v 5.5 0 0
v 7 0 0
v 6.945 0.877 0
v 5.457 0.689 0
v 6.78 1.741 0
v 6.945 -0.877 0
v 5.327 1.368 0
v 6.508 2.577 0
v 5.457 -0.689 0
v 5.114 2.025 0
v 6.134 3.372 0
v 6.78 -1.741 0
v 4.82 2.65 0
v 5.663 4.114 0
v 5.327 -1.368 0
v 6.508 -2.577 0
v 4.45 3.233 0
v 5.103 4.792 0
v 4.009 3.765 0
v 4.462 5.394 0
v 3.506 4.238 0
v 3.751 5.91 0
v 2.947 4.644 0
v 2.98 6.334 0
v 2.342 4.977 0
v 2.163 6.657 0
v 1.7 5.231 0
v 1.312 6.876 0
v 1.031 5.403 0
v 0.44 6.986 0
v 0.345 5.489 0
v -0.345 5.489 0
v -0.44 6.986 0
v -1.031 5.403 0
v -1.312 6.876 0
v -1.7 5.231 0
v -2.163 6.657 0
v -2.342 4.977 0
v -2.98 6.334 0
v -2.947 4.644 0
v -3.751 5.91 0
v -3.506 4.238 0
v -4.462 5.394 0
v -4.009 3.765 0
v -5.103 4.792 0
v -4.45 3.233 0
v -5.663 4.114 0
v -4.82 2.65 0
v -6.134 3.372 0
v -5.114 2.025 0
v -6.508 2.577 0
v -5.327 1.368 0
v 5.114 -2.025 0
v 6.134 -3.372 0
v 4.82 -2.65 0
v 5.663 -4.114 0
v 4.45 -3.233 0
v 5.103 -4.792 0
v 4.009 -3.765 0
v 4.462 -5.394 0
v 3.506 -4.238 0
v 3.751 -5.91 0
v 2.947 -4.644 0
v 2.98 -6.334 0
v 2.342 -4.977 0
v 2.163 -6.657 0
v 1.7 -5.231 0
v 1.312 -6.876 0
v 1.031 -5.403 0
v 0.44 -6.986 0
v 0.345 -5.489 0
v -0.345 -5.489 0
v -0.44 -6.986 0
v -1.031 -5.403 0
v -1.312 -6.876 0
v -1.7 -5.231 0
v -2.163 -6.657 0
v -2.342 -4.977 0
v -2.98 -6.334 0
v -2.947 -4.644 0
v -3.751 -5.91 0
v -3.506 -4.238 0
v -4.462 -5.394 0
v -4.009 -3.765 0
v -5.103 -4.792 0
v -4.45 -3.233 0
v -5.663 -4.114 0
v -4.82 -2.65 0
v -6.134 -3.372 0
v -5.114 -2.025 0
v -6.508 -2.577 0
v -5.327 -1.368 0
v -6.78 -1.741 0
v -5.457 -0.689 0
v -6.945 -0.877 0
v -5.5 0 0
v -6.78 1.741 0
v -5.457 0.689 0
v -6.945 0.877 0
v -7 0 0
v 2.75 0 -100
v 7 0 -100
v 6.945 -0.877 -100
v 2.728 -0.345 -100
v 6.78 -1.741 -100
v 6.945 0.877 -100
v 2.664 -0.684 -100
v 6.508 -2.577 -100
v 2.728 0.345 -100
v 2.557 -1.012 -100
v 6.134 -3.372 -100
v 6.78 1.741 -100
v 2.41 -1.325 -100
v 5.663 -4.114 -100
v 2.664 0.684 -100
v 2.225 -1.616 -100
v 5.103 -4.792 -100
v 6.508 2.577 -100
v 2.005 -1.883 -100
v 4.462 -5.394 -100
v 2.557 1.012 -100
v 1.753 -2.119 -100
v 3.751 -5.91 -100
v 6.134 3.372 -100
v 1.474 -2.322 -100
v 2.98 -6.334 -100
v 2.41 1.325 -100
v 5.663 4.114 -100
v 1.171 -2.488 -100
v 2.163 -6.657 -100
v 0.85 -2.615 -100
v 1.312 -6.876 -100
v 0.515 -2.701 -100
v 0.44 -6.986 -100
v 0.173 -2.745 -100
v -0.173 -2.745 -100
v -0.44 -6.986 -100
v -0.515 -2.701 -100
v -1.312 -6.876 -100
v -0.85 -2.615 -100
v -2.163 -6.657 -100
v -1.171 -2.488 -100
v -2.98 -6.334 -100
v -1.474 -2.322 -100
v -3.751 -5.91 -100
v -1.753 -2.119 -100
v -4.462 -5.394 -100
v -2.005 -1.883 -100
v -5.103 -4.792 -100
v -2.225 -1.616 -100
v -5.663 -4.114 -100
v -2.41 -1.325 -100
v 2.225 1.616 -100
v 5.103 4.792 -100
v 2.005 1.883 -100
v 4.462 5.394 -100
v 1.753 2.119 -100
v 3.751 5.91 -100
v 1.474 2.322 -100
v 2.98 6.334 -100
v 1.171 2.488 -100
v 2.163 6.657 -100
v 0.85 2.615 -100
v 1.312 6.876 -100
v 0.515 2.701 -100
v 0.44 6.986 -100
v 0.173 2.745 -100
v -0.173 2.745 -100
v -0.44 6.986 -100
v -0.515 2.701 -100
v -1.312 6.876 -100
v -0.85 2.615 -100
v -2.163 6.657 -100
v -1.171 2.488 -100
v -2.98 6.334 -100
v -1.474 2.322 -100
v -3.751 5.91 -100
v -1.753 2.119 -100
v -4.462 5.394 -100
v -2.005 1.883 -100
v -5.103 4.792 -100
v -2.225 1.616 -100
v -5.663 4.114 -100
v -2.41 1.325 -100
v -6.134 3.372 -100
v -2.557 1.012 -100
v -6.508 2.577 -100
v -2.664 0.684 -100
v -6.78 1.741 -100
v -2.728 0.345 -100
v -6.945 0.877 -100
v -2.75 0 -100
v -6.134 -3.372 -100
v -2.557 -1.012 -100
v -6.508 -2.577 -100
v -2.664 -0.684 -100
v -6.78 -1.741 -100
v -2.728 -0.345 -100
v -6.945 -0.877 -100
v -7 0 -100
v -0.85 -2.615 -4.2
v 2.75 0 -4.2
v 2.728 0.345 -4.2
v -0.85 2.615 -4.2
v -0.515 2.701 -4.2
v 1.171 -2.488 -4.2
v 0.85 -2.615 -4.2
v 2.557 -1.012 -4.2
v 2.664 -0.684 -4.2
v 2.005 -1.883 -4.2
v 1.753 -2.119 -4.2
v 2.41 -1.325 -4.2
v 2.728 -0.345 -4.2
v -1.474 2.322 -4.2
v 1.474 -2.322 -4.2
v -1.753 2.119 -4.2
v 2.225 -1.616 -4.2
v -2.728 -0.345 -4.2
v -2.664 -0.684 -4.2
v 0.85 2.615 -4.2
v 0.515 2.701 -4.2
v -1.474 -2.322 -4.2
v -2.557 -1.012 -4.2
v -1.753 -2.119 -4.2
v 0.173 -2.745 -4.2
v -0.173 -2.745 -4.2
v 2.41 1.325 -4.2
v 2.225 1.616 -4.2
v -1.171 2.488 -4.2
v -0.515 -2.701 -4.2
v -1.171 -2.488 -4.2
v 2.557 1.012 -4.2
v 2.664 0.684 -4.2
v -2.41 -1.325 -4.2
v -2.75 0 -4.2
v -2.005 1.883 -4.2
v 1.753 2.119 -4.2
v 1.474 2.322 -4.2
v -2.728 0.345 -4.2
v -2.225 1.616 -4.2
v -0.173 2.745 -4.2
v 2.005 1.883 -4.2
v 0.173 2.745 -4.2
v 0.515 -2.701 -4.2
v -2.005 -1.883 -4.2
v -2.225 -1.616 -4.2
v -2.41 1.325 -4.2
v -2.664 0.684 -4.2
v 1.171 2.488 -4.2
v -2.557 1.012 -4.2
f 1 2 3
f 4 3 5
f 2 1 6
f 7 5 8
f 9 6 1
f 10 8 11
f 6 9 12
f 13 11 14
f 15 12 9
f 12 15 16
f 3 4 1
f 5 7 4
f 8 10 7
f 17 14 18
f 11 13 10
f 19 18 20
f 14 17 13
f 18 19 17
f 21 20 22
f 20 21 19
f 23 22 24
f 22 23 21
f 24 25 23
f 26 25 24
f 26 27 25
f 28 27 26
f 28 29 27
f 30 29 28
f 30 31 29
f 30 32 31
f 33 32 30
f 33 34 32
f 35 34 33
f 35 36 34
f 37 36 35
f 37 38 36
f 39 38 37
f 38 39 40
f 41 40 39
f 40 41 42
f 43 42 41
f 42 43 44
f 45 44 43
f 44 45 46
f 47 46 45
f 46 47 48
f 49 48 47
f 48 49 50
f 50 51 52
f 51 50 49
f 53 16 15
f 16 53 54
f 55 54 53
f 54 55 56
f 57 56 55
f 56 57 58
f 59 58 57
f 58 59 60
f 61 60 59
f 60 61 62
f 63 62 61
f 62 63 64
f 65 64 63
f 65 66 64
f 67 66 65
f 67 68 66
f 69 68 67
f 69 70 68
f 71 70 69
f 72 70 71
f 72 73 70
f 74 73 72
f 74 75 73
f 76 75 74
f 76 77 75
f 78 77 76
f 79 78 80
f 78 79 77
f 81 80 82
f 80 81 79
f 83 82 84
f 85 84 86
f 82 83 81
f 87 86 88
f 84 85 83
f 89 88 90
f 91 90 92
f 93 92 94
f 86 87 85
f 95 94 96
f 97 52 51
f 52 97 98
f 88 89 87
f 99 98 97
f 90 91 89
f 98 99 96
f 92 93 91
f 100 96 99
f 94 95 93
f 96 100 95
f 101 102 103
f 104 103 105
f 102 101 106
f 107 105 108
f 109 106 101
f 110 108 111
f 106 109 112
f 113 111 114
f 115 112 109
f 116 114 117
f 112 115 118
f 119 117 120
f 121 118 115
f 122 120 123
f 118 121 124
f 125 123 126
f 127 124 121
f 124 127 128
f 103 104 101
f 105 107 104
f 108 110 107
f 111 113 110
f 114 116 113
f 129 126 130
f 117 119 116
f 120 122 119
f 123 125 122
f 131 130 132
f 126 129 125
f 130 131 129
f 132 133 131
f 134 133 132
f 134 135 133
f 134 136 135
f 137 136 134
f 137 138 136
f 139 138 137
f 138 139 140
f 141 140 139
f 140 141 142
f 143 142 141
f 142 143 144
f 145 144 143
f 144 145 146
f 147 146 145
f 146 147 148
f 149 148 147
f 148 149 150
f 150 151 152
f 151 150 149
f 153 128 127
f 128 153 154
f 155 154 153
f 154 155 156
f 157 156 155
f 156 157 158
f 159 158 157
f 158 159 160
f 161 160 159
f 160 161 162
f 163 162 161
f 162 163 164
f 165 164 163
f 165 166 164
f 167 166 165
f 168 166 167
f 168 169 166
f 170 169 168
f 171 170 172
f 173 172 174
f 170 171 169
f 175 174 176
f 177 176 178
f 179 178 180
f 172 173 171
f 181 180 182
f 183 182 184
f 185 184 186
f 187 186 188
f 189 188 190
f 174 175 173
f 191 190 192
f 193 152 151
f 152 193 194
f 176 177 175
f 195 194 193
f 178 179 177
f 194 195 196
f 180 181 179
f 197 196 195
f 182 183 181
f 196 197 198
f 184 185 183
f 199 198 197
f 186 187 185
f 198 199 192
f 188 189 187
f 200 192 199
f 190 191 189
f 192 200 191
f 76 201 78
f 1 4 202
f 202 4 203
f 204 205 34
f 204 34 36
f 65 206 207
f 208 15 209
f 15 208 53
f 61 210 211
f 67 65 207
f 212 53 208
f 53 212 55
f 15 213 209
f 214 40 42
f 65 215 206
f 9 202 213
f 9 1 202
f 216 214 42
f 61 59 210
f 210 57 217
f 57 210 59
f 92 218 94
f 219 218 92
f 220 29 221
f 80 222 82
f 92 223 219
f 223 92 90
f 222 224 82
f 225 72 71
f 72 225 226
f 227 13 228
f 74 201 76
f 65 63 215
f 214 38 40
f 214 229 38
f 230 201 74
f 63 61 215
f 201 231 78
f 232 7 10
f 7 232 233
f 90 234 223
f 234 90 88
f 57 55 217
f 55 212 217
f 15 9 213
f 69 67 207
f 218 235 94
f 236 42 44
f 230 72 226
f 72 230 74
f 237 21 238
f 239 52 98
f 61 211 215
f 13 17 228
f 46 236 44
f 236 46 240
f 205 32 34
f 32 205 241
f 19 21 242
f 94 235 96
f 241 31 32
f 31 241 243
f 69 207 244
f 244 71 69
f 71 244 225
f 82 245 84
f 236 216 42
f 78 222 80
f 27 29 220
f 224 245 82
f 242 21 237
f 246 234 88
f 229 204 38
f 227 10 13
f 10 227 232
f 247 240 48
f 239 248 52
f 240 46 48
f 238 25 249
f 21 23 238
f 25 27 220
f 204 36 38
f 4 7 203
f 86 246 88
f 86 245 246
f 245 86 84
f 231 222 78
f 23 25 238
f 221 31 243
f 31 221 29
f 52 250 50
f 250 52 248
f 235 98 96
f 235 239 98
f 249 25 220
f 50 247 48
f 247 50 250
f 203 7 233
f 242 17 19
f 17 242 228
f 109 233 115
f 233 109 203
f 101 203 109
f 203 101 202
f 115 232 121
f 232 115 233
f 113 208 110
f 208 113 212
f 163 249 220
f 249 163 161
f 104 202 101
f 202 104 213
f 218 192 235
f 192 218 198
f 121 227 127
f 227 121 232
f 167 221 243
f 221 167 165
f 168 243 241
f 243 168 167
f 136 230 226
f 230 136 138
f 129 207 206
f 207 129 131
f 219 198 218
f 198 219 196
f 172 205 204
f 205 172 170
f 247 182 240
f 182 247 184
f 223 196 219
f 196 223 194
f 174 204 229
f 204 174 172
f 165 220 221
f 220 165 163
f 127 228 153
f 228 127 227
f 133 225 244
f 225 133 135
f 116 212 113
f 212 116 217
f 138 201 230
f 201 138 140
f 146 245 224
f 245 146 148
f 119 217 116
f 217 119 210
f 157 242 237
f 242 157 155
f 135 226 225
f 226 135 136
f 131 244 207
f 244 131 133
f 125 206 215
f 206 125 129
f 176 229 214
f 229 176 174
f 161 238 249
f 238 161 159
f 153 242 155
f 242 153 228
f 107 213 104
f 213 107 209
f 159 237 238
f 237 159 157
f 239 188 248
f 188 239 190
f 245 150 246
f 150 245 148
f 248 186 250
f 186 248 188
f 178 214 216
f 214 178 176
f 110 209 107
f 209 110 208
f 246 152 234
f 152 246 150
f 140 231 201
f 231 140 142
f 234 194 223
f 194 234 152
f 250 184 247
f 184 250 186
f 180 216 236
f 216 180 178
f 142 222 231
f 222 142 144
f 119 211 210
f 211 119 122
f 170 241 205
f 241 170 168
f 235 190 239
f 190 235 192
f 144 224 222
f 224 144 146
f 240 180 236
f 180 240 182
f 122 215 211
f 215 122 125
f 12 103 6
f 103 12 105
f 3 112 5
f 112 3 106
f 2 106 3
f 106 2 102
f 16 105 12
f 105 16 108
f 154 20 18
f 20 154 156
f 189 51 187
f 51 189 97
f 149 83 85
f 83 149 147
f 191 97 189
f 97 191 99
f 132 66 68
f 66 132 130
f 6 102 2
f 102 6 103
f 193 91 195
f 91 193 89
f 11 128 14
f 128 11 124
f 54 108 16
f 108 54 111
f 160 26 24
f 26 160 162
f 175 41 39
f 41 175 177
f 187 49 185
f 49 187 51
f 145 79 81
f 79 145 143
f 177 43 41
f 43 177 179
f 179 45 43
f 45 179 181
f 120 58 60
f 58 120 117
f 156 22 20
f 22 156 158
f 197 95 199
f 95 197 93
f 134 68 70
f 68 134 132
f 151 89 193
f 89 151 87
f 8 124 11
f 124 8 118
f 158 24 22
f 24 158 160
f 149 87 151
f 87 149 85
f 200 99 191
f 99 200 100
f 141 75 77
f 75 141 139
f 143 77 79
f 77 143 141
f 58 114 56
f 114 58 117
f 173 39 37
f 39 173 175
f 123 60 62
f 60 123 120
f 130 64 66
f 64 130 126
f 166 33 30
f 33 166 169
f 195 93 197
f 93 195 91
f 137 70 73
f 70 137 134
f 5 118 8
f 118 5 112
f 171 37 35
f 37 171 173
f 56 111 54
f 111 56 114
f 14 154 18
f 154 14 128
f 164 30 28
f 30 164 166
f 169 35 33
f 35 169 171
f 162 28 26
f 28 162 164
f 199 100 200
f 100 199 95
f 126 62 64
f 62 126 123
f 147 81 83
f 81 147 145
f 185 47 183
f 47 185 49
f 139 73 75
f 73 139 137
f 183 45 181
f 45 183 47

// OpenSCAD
$fn = 50;


difference() {
	union() {
		translate(v = [0, 0, -100.0000000000]) {
			cylinder(h = 100, r = 7.0000000000);
		}
		cylinder(h = 0, r = 10.0000000000);
	}
	union() {
		translate(v = [0, 0, 0]) {
			rotate(a = [0, 0, 0]) {
				difference() {
					union() {
						#translate(v = [0, 0, -100.0000000000]) {
							cylinder(h = 100, r = 2.2500000000);
						}
						#translate(v = [0, 0, -4.2000000000]) {
							cylinder(h = 4.2000000000, r = 7.0000000000, r1 = 2.7500000000, r2 = 5.5000000000);
						}
						#translate(v = [0, 0, -100.0000000000]) {
							cylinder(h = 100, r = 2.7500000000);
						}
						#translate(v = [0, 0, -100.0000000000]) {
							cylinder(h = 100, r = 2.2500000000);
						}
					}
					union();
				}
			}
		}
	}
}
